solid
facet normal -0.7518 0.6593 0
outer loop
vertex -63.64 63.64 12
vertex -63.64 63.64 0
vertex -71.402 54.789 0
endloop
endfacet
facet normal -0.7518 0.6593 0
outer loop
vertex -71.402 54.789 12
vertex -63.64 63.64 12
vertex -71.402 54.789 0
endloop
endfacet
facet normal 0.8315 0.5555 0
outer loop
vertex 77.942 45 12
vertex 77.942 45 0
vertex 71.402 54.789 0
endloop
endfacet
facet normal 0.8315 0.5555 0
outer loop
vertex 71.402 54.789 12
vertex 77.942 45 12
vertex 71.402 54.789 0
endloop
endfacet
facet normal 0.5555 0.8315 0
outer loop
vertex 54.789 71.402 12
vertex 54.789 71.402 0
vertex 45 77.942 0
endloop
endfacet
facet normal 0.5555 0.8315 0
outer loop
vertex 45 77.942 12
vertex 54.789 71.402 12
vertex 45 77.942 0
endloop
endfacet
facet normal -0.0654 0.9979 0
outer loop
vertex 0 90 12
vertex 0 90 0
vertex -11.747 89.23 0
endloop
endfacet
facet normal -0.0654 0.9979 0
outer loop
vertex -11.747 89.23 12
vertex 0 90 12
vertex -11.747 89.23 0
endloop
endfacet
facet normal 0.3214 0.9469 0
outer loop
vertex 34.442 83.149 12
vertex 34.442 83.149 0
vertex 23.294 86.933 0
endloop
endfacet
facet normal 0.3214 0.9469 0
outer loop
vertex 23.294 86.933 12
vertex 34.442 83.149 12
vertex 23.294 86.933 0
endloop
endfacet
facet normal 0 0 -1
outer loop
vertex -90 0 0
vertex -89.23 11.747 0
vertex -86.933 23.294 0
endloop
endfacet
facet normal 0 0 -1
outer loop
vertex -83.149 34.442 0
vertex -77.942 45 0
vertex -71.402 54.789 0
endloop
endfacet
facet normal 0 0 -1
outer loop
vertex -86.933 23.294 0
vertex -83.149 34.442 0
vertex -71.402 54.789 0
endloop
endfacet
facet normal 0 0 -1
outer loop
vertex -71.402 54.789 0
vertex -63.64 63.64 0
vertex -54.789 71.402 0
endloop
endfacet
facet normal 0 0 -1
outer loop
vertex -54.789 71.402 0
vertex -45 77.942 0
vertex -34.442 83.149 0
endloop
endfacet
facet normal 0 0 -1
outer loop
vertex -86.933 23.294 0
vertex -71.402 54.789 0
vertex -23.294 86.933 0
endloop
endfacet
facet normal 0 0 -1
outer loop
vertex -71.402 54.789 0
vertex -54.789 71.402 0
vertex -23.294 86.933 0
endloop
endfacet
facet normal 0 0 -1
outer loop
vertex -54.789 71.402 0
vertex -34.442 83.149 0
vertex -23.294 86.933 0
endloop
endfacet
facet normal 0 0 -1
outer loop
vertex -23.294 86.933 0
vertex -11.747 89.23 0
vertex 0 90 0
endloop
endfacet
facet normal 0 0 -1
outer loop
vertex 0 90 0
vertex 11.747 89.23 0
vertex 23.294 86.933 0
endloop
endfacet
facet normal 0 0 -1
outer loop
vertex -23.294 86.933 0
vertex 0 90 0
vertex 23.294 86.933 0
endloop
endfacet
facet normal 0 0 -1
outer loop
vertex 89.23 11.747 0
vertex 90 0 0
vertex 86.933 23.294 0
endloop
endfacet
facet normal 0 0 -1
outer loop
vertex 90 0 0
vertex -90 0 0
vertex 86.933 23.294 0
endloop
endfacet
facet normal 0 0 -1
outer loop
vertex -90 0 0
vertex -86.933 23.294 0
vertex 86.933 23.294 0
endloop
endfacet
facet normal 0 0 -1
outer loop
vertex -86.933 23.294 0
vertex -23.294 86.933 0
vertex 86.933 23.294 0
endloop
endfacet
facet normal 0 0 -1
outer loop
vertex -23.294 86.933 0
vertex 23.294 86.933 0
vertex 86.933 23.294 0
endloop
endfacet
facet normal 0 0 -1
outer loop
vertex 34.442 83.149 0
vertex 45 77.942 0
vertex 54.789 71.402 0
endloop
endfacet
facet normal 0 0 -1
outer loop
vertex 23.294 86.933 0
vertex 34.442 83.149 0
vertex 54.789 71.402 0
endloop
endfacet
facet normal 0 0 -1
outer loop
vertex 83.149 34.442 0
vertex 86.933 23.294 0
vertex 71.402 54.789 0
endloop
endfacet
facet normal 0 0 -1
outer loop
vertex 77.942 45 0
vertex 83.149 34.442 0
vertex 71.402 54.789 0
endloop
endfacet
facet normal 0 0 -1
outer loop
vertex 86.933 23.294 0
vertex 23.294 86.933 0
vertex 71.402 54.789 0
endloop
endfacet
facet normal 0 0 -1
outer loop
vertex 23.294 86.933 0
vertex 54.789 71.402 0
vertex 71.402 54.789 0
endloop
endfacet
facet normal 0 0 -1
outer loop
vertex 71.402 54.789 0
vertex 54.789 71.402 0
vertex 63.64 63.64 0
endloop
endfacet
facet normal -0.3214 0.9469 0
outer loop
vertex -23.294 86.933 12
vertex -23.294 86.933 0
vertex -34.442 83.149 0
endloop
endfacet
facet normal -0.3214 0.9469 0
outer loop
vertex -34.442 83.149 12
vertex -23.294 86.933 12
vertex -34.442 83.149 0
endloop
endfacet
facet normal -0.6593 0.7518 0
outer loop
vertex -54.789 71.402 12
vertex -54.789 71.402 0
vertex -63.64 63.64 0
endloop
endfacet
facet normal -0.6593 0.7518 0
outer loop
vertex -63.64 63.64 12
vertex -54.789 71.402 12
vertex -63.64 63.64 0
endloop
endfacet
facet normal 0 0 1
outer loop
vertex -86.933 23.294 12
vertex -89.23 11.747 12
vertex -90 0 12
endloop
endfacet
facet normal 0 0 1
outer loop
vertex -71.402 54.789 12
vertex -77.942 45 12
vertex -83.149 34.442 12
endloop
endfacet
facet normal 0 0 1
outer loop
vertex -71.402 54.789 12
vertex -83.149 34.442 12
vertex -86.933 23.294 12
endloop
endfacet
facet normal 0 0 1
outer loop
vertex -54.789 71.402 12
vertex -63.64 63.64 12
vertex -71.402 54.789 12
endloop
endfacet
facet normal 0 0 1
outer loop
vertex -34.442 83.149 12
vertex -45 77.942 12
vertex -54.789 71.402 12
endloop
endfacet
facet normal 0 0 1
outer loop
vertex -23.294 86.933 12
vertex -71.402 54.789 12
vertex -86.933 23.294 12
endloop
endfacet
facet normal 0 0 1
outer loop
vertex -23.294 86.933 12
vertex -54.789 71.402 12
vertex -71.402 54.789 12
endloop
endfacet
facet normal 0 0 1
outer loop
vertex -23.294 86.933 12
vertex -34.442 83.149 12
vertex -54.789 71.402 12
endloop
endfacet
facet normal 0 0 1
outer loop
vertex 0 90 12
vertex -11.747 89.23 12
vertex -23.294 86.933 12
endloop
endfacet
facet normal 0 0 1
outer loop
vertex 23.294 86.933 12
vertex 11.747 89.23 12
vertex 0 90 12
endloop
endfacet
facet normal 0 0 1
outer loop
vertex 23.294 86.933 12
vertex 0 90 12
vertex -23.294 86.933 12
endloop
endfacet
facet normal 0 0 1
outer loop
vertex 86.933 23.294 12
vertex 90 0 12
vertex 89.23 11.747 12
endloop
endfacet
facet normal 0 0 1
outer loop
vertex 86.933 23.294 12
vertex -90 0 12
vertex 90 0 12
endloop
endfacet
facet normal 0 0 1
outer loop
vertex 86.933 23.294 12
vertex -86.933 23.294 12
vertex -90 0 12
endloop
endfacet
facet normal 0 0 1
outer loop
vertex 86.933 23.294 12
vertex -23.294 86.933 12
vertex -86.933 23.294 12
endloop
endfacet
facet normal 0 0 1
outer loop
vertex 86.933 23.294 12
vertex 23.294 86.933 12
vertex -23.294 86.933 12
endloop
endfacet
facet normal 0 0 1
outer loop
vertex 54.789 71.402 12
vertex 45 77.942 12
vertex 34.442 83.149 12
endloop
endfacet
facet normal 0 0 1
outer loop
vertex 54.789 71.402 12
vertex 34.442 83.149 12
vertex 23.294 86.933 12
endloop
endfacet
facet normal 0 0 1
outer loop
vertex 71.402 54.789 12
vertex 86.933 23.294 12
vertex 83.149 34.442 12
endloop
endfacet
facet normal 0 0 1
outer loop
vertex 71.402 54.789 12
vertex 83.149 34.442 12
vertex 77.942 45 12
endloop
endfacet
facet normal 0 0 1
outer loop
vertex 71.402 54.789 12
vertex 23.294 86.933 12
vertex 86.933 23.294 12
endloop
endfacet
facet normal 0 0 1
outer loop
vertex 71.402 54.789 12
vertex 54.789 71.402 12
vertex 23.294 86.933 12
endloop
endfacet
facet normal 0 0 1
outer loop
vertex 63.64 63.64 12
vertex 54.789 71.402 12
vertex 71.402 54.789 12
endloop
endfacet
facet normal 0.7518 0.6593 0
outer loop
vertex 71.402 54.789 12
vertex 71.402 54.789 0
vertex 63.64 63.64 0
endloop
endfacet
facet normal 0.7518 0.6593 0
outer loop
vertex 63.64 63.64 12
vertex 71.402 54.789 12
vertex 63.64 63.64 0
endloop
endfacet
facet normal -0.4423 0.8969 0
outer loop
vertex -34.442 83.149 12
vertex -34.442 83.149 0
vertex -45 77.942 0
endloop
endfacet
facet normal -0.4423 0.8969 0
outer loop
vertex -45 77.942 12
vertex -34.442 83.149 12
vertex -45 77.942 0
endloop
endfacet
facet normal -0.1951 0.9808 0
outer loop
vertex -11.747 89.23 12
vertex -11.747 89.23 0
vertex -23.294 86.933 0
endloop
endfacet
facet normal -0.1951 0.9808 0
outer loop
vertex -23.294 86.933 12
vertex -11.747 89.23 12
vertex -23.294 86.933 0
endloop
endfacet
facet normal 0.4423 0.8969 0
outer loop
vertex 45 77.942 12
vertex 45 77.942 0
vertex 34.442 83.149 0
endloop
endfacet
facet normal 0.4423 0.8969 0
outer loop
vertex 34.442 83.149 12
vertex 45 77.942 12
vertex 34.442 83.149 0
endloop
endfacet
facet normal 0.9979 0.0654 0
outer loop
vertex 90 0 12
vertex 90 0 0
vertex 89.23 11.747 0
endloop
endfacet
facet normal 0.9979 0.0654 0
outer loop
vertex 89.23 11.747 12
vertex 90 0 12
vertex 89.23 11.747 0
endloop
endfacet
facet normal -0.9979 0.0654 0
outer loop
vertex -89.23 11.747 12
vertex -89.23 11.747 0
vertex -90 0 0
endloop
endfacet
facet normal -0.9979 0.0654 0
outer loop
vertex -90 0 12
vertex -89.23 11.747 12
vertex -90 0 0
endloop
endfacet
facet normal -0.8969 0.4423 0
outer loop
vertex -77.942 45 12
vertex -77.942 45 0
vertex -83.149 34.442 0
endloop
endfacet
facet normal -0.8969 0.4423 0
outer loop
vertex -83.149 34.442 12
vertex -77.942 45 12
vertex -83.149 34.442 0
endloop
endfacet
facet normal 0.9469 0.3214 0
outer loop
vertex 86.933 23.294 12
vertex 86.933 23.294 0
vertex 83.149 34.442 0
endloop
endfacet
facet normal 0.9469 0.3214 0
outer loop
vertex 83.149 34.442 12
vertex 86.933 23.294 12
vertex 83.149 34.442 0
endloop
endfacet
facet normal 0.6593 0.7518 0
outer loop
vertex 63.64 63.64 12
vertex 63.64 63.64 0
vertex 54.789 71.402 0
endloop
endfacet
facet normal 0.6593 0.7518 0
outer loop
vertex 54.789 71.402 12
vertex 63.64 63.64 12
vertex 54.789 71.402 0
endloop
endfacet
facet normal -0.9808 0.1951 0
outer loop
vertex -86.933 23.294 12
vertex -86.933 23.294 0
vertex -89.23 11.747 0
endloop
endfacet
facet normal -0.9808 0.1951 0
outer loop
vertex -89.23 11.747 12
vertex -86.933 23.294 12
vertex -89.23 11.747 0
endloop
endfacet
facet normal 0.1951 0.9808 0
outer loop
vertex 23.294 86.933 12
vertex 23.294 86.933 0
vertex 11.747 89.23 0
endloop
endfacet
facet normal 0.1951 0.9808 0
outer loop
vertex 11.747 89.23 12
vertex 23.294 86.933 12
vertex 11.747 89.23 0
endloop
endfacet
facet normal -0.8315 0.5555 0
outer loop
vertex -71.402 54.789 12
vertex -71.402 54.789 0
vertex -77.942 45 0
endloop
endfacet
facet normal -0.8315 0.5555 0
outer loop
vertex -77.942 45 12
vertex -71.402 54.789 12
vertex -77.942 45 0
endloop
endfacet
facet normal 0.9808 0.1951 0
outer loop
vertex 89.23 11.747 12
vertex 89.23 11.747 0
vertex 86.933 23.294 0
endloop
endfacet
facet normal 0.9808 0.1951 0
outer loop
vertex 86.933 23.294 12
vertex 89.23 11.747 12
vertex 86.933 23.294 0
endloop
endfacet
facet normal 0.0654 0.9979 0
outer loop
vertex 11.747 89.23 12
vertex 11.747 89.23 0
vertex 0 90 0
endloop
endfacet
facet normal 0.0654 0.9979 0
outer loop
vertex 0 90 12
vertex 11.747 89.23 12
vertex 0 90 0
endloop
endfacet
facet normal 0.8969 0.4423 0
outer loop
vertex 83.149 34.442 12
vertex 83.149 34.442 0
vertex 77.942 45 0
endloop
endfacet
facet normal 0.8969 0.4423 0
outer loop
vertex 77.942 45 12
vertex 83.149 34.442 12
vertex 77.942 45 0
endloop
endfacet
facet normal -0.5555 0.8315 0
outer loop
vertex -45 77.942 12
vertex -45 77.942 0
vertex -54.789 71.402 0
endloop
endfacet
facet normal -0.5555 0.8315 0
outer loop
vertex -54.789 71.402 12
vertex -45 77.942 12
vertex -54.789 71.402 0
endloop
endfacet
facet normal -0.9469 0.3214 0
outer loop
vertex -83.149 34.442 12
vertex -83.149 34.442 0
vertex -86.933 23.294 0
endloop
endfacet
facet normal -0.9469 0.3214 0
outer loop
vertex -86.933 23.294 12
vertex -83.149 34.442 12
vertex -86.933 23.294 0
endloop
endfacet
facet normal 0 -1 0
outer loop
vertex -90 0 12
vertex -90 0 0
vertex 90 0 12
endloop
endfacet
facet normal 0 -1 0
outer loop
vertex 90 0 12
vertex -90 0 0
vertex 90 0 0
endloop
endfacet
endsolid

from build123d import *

# Parameters (mm, degrees)
SEMICIRCULAR_CAMERA_PLATFORM_DEPTH = 12


with BuildPart() as part:
    # 草图1 → Semicircular_camera_platform (new body)
    with BuildSketch(Plane.XY):
        Polygon((90, 0), (89.230037524, 11.7473573), (86.933324366, 23.293714059), (83.149157926, 34.441508913), (77.942286341, 45), (71.401800626, 54.788528611), (63.639610307, 63.639610307), (54.788528611, 71.401800626), (45, 77.942286341), (34.441508913, 83.149157926), (23.293714059, 86.933324366), (11.7473573, 89.230037524), (0, 90), (-11.7473573, 89.230037524), (-23.293714059, 86.933324366), (-34.441508913, 83.149157926), (-45, 77.942286341), (-54.788528611, 71.401800626), (-63.639610307, 63.639610307), (-71.401800626, 54.788528611), (-77.942286341, 45), (-83.149157926, 34.441508913), (-86.933324366, 23.293714059), (-89.230037524, 11.7473573), (-90, 0), align=None)
    extrude(amount=SEMICIRCULAR_CAMERA_PLATFORM_DEPTH)


solid = part.part
